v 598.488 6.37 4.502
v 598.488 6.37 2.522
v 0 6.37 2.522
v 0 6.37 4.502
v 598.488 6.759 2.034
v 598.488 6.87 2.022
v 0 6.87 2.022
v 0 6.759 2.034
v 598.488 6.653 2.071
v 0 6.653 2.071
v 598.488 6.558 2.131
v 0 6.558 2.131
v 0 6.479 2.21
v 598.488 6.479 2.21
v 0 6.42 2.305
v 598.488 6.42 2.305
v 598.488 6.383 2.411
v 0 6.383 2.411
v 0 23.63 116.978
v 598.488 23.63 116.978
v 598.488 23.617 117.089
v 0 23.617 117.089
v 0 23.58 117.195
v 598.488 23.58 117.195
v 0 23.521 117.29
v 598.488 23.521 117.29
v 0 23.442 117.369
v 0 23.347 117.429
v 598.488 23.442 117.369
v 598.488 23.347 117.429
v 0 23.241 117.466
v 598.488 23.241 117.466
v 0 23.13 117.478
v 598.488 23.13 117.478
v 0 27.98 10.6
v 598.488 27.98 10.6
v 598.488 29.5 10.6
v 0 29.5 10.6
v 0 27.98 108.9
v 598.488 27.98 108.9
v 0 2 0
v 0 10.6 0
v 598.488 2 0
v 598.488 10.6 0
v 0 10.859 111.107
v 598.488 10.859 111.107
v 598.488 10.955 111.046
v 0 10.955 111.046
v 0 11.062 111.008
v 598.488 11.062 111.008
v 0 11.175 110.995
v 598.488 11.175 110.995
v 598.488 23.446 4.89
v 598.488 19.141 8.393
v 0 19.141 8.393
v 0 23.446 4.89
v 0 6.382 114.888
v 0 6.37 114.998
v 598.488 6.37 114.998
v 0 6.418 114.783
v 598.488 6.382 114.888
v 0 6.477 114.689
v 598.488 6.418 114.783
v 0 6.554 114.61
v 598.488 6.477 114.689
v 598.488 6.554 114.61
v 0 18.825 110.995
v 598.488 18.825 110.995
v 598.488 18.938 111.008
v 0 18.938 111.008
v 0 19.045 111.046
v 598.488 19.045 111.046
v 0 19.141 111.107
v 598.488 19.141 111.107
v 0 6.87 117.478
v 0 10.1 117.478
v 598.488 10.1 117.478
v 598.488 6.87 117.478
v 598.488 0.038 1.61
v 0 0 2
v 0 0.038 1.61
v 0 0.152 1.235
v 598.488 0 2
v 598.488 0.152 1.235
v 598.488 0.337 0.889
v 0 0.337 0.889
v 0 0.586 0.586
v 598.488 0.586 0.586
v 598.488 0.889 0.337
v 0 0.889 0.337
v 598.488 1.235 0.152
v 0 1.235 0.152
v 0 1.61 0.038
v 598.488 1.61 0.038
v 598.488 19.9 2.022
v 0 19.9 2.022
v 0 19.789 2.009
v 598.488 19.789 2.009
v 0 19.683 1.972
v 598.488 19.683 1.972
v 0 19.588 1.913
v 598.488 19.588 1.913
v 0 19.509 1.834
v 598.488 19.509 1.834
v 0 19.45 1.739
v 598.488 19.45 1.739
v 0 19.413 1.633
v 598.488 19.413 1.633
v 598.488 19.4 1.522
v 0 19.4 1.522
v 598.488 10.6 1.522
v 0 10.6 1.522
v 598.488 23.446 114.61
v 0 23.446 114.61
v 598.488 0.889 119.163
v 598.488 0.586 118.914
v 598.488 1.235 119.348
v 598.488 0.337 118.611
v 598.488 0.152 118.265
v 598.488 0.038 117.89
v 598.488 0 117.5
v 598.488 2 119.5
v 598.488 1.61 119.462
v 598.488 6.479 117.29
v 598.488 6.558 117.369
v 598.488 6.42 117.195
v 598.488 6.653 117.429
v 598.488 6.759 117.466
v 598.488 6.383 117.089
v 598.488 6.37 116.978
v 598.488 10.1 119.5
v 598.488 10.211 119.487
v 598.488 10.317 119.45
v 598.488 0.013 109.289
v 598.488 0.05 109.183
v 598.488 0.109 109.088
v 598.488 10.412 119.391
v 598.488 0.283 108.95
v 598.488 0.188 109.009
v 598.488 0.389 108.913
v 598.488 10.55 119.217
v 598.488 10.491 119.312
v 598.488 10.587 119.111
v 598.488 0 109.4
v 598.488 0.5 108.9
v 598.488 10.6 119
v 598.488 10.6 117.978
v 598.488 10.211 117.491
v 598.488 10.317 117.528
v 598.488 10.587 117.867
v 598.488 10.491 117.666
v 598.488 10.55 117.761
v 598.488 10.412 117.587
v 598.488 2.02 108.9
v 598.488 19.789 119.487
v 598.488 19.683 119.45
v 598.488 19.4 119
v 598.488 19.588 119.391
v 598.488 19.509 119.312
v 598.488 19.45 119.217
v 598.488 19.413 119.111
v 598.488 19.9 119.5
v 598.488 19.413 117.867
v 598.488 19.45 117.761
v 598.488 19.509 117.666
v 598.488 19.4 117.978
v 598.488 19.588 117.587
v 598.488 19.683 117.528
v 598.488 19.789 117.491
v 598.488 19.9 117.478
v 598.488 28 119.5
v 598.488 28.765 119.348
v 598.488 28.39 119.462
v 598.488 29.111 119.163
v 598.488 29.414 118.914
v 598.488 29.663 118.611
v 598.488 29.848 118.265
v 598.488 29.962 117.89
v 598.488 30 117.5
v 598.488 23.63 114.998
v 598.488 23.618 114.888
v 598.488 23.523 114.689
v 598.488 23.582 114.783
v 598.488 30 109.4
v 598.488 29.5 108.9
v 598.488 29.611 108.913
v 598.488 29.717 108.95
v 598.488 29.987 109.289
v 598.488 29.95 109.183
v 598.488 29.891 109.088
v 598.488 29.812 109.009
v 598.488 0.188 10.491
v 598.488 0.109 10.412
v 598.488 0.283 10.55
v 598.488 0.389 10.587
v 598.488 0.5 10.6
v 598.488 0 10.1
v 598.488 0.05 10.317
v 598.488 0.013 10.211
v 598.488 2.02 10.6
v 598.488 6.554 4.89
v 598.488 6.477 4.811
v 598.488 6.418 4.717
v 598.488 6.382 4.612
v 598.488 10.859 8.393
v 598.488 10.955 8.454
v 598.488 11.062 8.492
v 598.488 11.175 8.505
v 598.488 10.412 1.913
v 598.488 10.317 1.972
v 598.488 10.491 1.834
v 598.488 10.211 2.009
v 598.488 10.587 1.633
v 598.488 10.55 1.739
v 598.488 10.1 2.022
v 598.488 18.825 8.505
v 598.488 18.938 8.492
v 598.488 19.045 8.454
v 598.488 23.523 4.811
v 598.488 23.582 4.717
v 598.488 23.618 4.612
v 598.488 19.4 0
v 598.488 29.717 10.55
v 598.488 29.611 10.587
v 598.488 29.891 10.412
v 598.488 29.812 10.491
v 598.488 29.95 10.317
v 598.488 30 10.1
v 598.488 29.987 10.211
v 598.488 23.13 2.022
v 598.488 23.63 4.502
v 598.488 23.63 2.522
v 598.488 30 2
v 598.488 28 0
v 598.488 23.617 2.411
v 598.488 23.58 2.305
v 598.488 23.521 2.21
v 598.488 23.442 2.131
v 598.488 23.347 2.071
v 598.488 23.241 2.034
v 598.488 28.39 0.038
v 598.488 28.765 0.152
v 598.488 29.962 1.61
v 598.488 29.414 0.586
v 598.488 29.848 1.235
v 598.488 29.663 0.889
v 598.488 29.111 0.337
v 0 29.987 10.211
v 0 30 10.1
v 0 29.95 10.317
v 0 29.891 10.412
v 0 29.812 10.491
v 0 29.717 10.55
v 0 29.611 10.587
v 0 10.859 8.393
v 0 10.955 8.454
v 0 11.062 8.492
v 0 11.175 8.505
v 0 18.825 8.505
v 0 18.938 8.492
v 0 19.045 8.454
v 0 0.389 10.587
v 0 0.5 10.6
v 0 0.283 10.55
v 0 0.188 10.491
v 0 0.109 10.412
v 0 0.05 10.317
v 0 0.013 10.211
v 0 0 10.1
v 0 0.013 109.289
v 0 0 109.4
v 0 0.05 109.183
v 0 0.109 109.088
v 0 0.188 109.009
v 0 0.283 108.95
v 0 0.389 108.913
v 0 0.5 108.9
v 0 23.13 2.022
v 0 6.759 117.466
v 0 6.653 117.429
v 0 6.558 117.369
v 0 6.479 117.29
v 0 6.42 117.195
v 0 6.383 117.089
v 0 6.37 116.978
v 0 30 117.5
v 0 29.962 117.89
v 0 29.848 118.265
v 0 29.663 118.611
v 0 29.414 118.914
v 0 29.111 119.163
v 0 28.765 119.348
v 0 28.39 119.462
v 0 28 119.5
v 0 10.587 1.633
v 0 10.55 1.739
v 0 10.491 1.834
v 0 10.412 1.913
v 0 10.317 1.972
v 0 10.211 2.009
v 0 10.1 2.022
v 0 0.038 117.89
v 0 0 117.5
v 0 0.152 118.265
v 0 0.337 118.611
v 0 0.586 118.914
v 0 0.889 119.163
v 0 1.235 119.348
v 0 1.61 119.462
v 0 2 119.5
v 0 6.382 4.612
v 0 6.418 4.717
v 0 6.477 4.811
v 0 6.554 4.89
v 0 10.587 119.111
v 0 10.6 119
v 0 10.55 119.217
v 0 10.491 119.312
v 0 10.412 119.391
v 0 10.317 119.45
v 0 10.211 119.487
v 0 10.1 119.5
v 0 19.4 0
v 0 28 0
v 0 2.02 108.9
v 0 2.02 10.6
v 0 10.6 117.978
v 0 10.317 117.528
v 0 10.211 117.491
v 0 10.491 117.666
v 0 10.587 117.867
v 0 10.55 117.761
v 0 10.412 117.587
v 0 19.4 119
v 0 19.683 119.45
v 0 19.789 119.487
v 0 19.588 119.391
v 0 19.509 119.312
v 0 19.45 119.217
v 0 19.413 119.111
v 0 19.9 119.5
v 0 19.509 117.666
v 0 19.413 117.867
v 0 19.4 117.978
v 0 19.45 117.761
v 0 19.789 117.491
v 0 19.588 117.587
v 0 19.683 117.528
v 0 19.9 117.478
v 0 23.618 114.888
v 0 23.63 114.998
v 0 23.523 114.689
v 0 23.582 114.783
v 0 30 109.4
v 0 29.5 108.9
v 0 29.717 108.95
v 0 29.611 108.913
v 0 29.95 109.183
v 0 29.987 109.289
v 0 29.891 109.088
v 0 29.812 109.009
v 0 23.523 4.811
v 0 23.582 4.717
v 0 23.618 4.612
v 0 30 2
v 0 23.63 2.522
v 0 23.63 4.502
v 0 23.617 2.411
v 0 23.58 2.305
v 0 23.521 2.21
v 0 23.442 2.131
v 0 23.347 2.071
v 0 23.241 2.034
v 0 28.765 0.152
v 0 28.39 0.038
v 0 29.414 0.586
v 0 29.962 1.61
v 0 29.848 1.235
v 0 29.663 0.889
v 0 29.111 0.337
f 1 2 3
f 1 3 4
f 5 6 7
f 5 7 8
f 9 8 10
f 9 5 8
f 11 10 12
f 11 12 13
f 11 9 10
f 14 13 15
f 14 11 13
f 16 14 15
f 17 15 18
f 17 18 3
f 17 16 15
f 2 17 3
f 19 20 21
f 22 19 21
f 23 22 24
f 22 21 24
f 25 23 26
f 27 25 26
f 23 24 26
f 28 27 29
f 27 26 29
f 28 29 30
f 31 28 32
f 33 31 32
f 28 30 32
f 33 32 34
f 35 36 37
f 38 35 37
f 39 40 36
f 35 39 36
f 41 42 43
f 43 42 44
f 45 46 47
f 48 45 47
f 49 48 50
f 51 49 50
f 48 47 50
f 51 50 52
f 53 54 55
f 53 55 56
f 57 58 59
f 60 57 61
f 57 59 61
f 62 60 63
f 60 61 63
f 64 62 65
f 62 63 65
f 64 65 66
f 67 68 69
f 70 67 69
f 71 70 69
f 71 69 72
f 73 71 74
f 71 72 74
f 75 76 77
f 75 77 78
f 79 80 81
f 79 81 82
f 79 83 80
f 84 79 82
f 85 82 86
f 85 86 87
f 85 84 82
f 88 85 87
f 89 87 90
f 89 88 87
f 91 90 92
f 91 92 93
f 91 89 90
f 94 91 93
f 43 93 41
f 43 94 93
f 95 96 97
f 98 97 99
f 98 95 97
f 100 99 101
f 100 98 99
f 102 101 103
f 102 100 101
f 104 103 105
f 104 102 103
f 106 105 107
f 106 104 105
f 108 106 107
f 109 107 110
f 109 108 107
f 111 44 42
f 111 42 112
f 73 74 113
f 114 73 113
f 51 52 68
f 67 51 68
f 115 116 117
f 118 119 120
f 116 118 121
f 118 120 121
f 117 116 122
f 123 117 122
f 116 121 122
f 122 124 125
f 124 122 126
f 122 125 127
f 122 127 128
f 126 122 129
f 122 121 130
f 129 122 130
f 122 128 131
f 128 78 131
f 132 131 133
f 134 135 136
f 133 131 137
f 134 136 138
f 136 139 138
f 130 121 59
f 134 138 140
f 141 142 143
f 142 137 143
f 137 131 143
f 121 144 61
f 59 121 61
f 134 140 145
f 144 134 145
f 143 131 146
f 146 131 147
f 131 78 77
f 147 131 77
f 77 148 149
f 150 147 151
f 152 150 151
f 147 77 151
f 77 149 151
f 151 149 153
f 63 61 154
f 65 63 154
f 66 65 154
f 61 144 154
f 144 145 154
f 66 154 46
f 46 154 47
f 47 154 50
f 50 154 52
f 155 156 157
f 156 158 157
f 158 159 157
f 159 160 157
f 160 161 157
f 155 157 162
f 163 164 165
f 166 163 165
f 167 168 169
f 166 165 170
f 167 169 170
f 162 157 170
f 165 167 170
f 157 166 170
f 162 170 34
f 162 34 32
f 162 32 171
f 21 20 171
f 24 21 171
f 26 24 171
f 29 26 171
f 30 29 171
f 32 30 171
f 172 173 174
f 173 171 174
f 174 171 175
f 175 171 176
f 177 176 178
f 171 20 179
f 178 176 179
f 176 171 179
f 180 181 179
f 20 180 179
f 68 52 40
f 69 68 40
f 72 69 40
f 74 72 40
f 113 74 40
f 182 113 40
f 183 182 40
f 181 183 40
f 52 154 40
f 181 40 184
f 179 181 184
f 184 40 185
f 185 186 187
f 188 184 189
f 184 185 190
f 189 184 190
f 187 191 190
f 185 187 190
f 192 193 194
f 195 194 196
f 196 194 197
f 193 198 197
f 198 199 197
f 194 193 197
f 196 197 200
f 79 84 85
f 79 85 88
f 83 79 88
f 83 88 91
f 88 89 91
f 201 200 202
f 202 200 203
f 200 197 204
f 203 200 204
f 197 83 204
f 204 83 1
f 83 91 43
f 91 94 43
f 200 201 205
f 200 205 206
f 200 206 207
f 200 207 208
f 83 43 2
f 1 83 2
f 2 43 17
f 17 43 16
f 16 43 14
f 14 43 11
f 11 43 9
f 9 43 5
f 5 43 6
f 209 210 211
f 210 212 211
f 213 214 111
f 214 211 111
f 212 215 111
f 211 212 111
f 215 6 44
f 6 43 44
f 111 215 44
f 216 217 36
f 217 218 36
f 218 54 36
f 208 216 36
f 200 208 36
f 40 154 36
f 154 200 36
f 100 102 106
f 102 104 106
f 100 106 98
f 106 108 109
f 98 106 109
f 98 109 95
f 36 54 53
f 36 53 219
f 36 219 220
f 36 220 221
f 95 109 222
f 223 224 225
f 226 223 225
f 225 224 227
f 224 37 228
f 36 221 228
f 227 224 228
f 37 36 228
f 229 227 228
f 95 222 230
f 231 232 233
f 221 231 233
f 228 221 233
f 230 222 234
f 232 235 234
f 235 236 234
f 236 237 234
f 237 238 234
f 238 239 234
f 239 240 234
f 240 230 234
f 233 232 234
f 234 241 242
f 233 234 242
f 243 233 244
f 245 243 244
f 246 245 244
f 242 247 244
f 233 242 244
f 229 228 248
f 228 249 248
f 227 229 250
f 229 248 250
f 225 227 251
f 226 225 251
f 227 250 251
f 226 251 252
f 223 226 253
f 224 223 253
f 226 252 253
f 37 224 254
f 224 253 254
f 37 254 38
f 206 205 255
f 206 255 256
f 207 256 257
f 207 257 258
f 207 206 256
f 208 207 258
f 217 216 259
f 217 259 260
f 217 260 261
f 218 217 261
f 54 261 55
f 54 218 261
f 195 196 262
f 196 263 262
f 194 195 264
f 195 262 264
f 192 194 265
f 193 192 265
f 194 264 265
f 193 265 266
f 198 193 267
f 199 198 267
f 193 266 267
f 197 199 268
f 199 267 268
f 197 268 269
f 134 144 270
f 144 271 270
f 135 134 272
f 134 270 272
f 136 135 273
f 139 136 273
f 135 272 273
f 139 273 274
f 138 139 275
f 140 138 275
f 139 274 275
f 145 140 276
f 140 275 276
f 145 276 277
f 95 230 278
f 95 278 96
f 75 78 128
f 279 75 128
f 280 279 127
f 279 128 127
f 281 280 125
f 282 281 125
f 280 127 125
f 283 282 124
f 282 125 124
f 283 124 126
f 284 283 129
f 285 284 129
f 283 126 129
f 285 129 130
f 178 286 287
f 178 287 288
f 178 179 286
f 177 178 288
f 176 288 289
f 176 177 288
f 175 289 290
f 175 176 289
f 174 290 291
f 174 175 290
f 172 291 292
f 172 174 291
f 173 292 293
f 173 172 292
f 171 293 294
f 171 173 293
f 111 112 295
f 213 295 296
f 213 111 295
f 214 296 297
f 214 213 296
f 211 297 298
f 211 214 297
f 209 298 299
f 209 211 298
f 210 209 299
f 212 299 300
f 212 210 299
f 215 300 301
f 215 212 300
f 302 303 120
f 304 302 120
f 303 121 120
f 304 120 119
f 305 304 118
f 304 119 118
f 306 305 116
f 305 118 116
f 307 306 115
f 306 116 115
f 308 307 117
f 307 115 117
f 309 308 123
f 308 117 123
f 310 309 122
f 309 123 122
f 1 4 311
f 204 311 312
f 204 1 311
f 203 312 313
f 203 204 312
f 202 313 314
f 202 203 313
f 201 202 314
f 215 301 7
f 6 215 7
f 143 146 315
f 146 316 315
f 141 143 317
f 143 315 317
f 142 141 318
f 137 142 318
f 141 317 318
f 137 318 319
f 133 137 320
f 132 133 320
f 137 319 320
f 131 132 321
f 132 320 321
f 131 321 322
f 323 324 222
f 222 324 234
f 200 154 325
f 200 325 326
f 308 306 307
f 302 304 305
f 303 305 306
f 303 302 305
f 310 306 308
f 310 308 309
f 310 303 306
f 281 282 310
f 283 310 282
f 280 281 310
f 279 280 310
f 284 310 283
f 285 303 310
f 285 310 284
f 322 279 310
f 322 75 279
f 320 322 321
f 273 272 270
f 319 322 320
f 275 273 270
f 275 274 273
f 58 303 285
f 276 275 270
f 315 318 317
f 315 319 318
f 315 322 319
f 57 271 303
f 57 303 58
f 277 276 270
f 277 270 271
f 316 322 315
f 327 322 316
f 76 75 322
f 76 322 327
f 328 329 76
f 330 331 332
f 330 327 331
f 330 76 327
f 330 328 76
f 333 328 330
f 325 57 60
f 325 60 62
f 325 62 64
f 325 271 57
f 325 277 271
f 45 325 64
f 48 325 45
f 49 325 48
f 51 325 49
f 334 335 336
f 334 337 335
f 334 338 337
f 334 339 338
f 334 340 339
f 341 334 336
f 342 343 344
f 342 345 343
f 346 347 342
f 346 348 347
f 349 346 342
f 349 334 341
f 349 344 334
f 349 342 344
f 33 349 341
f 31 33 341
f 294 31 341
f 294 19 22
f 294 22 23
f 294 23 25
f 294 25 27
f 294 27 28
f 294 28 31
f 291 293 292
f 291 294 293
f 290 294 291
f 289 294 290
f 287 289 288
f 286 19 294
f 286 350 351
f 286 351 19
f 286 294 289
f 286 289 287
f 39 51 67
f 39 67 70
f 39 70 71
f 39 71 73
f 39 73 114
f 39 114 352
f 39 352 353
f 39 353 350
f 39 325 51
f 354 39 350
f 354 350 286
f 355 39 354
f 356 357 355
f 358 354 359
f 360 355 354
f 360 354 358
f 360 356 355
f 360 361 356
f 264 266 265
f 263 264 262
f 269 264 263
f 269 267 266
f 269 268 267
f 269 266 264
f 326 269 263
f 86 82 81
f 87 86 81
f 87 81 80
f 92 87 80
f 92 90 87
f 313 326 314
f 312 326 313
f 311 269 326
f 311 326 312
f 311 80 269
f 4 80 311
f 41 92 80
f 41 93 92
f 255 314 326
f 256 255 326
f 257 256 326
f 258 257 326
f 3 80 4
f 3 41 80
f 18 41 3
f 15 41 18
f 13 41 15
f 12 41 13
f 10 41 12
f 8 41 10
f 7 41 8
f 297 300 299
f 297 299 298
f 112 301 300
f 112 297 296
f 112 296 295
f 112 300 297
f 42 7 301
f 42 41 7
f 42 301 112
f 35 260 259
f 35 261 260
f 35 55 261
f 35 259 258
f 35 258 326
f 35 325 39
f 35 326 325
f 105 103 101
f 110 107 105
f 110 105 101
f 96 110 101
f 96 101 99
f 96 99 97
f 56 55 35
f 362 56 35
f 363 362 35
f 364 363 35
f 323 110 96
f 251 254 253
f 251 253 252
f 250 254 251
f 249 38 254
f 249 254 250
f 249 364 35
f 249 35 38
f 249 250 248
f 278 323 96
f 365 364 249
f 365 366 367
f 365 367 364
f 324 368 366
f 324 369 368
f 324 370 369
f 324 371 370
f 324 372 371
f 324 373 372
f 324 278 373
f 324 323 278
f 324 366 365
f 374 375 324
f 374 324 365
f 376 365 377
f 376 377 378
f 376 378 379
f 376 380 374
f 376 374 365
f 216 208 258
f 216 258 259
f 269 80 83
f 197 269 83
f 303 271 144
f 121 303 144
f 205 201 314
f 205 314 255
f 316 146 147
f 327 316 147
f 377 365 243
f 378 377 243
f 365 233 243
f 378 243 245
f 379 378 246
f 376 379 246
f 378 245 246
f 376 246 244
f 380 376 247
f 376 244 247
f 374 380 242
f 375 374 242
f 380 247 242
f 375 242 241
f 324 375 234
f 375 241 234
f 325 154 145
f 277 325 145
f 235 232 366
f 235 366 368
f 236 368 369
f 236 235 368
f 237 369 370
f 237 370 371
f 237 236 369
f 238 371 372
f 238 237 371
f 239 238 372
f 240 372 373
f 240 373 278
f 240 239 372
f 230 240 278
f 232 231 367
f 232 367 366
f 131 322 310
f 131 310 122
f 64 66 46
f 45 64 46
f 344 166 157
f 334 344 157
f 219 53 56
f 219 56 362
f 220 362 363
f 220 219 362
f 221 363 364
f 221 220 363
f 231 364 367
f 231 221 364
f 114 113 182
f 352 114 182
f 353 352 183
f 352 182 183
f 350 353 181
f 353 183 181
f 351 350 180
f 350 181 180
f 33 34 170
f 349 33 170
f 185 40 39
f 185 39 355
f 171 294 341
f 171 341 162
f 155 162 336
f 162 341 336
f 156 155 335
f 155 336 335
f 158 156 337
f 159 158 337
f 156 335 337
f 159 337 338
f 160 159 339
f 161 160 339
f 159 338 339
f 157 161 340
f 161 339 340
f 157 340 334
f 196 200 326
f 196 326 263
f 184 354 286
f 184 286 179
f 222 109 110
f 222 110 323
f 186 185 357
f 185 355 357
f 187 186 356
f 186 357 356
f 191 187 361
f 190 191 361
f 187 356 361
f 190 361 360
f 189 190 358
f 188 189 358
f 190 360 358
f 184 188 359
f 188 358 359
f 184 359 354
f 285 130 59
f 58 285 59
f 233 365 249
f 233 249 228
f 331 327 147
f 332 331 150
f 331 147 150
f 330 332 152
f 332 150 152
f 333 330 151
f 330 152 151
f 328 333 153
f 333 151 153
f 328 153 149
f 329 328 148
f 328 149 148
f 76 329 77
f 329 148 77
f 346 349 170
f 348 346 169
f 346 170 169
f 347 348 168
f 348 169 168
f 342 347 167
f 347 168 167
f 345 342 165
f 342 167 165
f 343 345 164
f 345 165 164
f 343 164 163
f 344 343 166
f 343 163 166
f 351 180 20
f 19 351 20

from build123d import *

# Parameters (mm, degrees)
SKETCH1_W           = 598.4875
SKETCH1_H           = 30
BOSS_EXTRUDE1_DEPTH = 119.5
FILLET1_R           = 2
CUT_EXTRUDE1_REACH  = 613.038
FILLET2_R           = 0.5
CUT_EXTRUDE2_REACH  = 613.038
SKETCH3_W           = 98.3
SKETCH3_H           = 2.02
FILLET3_R           = 0.5


with BuildPart() as part:
    # Sketch1 → Boss-Extrude1 (new body)
    with BuildSketch(Plane.XY):
        with Locations((299.24375, 15)):
            Rectangle(SKETCH1_W, SKETCH1_H)
    extrude(amount=BOSS_EXTRUDE1_DEPTH)

    # Fillet1
    fillet1_edges = [part.edges().sort_by_distance(p)[0] for p in [
        (299.24375, 0, 119.5),
        (299.24375, 0, 0),
        (299.24375, 30, 0),
        (299.24375, 30, 119.5),
    ]]
    fillet(fillet1_edges, radius=FILLET1_R)

    # Sketch2 → Cut-Extrude1 (cut, up to next)
    with BuildSketch(Plane(origin=(598.4875, 0, 0), x_dir=(0, 0, -1), z_dir=(1, 0, 0)), mode=Mode.PRIVATE) as cut_extrude1_sk1:
        with BuildLine():
            Line((-119.5, 19.4), (-119.5, 10.6))
            Line((-119.5, 10.6), (-117.978098197, 10.6))
            ThreePointArc((-117.978098197, 10.6), (-117.624544806, 10.453553391), (-117.478098197, 10.1))
            Line((-117.478098197, 10.1), (-117.478098197, 6.87))
            ThreePointArc((-117.478098197, 6.87), (-117.331651588, 6.516446609), (-116.978098197, 6.37))
            Line((-116.978098197, 6.37), (-114.998098197, 6.37))
            ThreePointArc((-114.998098197, 6.37), (-114.783369216, 6.418456575), (-114.610260359, 6.554434141))
            Line((-114.610260359, 6.554434141), (-111.107479321, 10.859434141))
            ThreePointArc((-111.107479321, 10.859434141), (-111.024191423, 11.0075469), (-110.995317159, 11.175))
            Line((-110.995317159, 11.175), (-110.995317159, 18.825))
            ThreePointArc((-110.995317159, 18.825), (-111.024191423, 18.9924531), (-111.107479321, 19.140565859))
            Line((-111.107479321, 19.140565859), (-114.610260359, 23.445565859))
            ThreePointArc((-114.610260359, 23.445565859), (-114.783369216, 23.581543425), (-114.998098197, 23.63))
            Line((-114.998098197, 23.63), (-116.978098197, 23.63))
            ThreePointArc((-116.978098197, 23.63), (-117.331651588, 23.483553391), (-117.478098197, 23.13))
            Line((-117.478098197, 23.13), (-117.478098197, 19.9))
            ThreePointArc((-117.478098197, 19.9), (-117.624544806, 19.546446609), (-117.978098197, 19.4))
            Line((-117.978098197, 19.4), (-119.5, 19.4))
        make_face()
    cut_extrude1_tool1 = extrude(cut_extrude1_sk1.sketch, amount=-CUT_EXTRUDE1_REACH, mode=Mode.PRIVATE) & part.part
    cut_extrude1 = cut_extrude1_tool1.solids().sort_by_distance((598.4875, 15, 115.219459))[0]
    add(cut_extrude1, mode=Mode.SUBTRACT)

    # Mirror1: Cut-Extrude1 across plane
    add(cut_extrude1.mirror(Plane(origin=(0, 0, 59.75), x_dir=(1, 0, 0), z_dir=(0, 0, -1))), mode=Mode.SUBTRACT)

    # Fillet2
    fillet2_edges = [part.edges().sort_by_distance(p)[0] for p in [
        (299.24375, 10.6, 119.5),
        (299.24375, 19.4, 119.5),
    ]]
    fillet(fillet2_edges, radius=FILLET2_R)

    # Sketch3 → Cut-Extrude2 (cut, up to next)
    with BuildSketch(Plane(origin=(598.4875, 0, 0), x_dir=(0, 0, -1), z_dir=(1, 0, 0)), mode=Mode.PRIVATE) as cut_extrude2_sk1:
        with Locations((-59.75, 28.99)):
            Rectangle(SKETCH3_W, SKETCH3_H)
    cut_extrude2_tool1 = extrude(cut_extrude2_sk1.sketch, amount=-CUT_EXTRUDE2_REACH, mode=Mode.PRIVATE) & part.part
    cut_extrude2 = cut_extrude2_tool1.solids().sort_by_distance((598.4875, 28.99, 59.75))[0]
    add(cut_extrude2, mode=Mode.SUBTRACT)

    # Mirror2: Cut-Extrude2 across plane
    add(cut_extrude2.mirror(Plane.ZX.offset(15)), mode=Mode.SUBTRACT)

    # Fillet3
    fillet3_edges = [part.edges().sort_by_distance(p)[0] for p in [
        (299.24375, 30, 108.9),
        (299.24375, 30, 10.6),
        (299.24375, 0, 108.9),
        (299.24375, 0, 10.6),
    ]]
    fillet(fillet3_edges, radius=FILLET3_R)


solid = part.part
